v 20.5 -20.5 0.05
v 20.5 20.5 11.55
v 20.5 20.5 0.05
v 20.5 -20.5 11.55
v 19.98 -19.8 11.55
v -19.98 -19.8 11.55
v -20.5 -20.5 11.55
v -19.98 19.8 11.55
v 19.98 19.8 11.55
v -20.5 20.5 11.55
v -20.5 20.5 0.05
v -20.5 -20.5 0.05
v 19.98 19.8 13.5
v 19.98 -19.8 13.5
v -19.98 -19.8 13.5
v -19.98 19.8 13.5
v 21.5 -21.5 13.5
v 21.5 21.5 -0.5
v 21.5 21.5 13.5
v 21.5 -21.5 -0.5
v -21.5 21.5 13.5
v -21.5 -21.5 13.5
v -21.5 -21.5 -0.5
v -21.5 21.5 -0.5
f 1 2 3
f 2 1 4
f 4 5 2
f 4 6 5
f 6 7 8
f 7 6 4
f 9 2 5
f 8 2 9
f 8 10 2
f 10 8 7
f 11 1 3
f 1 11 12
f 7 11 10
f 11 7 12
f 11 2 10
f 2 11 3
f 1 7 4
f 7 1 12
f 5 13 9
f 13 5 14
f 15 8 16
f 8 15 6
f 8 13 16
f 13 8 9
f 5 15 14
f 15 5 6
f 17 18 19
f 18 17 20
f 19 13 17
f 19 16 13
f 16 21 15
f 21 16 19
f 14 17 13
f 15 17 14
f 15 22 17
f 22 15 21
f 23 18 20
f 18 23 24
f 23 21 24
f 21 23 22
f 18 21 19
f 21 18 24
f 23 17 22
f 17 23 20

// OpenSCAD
module case1(){
    translate([0,0,6.5]){
        cube([43,43,14],true);
    }
}
module case2(){
    translate([0,0,5.8]){
        cube([41,41,11.5],true);
    }
    translate([0,0,7.5]){
        cube([39.96,39.6,13],true);
    }
}
difference(){
    case1();
    case2();
}
